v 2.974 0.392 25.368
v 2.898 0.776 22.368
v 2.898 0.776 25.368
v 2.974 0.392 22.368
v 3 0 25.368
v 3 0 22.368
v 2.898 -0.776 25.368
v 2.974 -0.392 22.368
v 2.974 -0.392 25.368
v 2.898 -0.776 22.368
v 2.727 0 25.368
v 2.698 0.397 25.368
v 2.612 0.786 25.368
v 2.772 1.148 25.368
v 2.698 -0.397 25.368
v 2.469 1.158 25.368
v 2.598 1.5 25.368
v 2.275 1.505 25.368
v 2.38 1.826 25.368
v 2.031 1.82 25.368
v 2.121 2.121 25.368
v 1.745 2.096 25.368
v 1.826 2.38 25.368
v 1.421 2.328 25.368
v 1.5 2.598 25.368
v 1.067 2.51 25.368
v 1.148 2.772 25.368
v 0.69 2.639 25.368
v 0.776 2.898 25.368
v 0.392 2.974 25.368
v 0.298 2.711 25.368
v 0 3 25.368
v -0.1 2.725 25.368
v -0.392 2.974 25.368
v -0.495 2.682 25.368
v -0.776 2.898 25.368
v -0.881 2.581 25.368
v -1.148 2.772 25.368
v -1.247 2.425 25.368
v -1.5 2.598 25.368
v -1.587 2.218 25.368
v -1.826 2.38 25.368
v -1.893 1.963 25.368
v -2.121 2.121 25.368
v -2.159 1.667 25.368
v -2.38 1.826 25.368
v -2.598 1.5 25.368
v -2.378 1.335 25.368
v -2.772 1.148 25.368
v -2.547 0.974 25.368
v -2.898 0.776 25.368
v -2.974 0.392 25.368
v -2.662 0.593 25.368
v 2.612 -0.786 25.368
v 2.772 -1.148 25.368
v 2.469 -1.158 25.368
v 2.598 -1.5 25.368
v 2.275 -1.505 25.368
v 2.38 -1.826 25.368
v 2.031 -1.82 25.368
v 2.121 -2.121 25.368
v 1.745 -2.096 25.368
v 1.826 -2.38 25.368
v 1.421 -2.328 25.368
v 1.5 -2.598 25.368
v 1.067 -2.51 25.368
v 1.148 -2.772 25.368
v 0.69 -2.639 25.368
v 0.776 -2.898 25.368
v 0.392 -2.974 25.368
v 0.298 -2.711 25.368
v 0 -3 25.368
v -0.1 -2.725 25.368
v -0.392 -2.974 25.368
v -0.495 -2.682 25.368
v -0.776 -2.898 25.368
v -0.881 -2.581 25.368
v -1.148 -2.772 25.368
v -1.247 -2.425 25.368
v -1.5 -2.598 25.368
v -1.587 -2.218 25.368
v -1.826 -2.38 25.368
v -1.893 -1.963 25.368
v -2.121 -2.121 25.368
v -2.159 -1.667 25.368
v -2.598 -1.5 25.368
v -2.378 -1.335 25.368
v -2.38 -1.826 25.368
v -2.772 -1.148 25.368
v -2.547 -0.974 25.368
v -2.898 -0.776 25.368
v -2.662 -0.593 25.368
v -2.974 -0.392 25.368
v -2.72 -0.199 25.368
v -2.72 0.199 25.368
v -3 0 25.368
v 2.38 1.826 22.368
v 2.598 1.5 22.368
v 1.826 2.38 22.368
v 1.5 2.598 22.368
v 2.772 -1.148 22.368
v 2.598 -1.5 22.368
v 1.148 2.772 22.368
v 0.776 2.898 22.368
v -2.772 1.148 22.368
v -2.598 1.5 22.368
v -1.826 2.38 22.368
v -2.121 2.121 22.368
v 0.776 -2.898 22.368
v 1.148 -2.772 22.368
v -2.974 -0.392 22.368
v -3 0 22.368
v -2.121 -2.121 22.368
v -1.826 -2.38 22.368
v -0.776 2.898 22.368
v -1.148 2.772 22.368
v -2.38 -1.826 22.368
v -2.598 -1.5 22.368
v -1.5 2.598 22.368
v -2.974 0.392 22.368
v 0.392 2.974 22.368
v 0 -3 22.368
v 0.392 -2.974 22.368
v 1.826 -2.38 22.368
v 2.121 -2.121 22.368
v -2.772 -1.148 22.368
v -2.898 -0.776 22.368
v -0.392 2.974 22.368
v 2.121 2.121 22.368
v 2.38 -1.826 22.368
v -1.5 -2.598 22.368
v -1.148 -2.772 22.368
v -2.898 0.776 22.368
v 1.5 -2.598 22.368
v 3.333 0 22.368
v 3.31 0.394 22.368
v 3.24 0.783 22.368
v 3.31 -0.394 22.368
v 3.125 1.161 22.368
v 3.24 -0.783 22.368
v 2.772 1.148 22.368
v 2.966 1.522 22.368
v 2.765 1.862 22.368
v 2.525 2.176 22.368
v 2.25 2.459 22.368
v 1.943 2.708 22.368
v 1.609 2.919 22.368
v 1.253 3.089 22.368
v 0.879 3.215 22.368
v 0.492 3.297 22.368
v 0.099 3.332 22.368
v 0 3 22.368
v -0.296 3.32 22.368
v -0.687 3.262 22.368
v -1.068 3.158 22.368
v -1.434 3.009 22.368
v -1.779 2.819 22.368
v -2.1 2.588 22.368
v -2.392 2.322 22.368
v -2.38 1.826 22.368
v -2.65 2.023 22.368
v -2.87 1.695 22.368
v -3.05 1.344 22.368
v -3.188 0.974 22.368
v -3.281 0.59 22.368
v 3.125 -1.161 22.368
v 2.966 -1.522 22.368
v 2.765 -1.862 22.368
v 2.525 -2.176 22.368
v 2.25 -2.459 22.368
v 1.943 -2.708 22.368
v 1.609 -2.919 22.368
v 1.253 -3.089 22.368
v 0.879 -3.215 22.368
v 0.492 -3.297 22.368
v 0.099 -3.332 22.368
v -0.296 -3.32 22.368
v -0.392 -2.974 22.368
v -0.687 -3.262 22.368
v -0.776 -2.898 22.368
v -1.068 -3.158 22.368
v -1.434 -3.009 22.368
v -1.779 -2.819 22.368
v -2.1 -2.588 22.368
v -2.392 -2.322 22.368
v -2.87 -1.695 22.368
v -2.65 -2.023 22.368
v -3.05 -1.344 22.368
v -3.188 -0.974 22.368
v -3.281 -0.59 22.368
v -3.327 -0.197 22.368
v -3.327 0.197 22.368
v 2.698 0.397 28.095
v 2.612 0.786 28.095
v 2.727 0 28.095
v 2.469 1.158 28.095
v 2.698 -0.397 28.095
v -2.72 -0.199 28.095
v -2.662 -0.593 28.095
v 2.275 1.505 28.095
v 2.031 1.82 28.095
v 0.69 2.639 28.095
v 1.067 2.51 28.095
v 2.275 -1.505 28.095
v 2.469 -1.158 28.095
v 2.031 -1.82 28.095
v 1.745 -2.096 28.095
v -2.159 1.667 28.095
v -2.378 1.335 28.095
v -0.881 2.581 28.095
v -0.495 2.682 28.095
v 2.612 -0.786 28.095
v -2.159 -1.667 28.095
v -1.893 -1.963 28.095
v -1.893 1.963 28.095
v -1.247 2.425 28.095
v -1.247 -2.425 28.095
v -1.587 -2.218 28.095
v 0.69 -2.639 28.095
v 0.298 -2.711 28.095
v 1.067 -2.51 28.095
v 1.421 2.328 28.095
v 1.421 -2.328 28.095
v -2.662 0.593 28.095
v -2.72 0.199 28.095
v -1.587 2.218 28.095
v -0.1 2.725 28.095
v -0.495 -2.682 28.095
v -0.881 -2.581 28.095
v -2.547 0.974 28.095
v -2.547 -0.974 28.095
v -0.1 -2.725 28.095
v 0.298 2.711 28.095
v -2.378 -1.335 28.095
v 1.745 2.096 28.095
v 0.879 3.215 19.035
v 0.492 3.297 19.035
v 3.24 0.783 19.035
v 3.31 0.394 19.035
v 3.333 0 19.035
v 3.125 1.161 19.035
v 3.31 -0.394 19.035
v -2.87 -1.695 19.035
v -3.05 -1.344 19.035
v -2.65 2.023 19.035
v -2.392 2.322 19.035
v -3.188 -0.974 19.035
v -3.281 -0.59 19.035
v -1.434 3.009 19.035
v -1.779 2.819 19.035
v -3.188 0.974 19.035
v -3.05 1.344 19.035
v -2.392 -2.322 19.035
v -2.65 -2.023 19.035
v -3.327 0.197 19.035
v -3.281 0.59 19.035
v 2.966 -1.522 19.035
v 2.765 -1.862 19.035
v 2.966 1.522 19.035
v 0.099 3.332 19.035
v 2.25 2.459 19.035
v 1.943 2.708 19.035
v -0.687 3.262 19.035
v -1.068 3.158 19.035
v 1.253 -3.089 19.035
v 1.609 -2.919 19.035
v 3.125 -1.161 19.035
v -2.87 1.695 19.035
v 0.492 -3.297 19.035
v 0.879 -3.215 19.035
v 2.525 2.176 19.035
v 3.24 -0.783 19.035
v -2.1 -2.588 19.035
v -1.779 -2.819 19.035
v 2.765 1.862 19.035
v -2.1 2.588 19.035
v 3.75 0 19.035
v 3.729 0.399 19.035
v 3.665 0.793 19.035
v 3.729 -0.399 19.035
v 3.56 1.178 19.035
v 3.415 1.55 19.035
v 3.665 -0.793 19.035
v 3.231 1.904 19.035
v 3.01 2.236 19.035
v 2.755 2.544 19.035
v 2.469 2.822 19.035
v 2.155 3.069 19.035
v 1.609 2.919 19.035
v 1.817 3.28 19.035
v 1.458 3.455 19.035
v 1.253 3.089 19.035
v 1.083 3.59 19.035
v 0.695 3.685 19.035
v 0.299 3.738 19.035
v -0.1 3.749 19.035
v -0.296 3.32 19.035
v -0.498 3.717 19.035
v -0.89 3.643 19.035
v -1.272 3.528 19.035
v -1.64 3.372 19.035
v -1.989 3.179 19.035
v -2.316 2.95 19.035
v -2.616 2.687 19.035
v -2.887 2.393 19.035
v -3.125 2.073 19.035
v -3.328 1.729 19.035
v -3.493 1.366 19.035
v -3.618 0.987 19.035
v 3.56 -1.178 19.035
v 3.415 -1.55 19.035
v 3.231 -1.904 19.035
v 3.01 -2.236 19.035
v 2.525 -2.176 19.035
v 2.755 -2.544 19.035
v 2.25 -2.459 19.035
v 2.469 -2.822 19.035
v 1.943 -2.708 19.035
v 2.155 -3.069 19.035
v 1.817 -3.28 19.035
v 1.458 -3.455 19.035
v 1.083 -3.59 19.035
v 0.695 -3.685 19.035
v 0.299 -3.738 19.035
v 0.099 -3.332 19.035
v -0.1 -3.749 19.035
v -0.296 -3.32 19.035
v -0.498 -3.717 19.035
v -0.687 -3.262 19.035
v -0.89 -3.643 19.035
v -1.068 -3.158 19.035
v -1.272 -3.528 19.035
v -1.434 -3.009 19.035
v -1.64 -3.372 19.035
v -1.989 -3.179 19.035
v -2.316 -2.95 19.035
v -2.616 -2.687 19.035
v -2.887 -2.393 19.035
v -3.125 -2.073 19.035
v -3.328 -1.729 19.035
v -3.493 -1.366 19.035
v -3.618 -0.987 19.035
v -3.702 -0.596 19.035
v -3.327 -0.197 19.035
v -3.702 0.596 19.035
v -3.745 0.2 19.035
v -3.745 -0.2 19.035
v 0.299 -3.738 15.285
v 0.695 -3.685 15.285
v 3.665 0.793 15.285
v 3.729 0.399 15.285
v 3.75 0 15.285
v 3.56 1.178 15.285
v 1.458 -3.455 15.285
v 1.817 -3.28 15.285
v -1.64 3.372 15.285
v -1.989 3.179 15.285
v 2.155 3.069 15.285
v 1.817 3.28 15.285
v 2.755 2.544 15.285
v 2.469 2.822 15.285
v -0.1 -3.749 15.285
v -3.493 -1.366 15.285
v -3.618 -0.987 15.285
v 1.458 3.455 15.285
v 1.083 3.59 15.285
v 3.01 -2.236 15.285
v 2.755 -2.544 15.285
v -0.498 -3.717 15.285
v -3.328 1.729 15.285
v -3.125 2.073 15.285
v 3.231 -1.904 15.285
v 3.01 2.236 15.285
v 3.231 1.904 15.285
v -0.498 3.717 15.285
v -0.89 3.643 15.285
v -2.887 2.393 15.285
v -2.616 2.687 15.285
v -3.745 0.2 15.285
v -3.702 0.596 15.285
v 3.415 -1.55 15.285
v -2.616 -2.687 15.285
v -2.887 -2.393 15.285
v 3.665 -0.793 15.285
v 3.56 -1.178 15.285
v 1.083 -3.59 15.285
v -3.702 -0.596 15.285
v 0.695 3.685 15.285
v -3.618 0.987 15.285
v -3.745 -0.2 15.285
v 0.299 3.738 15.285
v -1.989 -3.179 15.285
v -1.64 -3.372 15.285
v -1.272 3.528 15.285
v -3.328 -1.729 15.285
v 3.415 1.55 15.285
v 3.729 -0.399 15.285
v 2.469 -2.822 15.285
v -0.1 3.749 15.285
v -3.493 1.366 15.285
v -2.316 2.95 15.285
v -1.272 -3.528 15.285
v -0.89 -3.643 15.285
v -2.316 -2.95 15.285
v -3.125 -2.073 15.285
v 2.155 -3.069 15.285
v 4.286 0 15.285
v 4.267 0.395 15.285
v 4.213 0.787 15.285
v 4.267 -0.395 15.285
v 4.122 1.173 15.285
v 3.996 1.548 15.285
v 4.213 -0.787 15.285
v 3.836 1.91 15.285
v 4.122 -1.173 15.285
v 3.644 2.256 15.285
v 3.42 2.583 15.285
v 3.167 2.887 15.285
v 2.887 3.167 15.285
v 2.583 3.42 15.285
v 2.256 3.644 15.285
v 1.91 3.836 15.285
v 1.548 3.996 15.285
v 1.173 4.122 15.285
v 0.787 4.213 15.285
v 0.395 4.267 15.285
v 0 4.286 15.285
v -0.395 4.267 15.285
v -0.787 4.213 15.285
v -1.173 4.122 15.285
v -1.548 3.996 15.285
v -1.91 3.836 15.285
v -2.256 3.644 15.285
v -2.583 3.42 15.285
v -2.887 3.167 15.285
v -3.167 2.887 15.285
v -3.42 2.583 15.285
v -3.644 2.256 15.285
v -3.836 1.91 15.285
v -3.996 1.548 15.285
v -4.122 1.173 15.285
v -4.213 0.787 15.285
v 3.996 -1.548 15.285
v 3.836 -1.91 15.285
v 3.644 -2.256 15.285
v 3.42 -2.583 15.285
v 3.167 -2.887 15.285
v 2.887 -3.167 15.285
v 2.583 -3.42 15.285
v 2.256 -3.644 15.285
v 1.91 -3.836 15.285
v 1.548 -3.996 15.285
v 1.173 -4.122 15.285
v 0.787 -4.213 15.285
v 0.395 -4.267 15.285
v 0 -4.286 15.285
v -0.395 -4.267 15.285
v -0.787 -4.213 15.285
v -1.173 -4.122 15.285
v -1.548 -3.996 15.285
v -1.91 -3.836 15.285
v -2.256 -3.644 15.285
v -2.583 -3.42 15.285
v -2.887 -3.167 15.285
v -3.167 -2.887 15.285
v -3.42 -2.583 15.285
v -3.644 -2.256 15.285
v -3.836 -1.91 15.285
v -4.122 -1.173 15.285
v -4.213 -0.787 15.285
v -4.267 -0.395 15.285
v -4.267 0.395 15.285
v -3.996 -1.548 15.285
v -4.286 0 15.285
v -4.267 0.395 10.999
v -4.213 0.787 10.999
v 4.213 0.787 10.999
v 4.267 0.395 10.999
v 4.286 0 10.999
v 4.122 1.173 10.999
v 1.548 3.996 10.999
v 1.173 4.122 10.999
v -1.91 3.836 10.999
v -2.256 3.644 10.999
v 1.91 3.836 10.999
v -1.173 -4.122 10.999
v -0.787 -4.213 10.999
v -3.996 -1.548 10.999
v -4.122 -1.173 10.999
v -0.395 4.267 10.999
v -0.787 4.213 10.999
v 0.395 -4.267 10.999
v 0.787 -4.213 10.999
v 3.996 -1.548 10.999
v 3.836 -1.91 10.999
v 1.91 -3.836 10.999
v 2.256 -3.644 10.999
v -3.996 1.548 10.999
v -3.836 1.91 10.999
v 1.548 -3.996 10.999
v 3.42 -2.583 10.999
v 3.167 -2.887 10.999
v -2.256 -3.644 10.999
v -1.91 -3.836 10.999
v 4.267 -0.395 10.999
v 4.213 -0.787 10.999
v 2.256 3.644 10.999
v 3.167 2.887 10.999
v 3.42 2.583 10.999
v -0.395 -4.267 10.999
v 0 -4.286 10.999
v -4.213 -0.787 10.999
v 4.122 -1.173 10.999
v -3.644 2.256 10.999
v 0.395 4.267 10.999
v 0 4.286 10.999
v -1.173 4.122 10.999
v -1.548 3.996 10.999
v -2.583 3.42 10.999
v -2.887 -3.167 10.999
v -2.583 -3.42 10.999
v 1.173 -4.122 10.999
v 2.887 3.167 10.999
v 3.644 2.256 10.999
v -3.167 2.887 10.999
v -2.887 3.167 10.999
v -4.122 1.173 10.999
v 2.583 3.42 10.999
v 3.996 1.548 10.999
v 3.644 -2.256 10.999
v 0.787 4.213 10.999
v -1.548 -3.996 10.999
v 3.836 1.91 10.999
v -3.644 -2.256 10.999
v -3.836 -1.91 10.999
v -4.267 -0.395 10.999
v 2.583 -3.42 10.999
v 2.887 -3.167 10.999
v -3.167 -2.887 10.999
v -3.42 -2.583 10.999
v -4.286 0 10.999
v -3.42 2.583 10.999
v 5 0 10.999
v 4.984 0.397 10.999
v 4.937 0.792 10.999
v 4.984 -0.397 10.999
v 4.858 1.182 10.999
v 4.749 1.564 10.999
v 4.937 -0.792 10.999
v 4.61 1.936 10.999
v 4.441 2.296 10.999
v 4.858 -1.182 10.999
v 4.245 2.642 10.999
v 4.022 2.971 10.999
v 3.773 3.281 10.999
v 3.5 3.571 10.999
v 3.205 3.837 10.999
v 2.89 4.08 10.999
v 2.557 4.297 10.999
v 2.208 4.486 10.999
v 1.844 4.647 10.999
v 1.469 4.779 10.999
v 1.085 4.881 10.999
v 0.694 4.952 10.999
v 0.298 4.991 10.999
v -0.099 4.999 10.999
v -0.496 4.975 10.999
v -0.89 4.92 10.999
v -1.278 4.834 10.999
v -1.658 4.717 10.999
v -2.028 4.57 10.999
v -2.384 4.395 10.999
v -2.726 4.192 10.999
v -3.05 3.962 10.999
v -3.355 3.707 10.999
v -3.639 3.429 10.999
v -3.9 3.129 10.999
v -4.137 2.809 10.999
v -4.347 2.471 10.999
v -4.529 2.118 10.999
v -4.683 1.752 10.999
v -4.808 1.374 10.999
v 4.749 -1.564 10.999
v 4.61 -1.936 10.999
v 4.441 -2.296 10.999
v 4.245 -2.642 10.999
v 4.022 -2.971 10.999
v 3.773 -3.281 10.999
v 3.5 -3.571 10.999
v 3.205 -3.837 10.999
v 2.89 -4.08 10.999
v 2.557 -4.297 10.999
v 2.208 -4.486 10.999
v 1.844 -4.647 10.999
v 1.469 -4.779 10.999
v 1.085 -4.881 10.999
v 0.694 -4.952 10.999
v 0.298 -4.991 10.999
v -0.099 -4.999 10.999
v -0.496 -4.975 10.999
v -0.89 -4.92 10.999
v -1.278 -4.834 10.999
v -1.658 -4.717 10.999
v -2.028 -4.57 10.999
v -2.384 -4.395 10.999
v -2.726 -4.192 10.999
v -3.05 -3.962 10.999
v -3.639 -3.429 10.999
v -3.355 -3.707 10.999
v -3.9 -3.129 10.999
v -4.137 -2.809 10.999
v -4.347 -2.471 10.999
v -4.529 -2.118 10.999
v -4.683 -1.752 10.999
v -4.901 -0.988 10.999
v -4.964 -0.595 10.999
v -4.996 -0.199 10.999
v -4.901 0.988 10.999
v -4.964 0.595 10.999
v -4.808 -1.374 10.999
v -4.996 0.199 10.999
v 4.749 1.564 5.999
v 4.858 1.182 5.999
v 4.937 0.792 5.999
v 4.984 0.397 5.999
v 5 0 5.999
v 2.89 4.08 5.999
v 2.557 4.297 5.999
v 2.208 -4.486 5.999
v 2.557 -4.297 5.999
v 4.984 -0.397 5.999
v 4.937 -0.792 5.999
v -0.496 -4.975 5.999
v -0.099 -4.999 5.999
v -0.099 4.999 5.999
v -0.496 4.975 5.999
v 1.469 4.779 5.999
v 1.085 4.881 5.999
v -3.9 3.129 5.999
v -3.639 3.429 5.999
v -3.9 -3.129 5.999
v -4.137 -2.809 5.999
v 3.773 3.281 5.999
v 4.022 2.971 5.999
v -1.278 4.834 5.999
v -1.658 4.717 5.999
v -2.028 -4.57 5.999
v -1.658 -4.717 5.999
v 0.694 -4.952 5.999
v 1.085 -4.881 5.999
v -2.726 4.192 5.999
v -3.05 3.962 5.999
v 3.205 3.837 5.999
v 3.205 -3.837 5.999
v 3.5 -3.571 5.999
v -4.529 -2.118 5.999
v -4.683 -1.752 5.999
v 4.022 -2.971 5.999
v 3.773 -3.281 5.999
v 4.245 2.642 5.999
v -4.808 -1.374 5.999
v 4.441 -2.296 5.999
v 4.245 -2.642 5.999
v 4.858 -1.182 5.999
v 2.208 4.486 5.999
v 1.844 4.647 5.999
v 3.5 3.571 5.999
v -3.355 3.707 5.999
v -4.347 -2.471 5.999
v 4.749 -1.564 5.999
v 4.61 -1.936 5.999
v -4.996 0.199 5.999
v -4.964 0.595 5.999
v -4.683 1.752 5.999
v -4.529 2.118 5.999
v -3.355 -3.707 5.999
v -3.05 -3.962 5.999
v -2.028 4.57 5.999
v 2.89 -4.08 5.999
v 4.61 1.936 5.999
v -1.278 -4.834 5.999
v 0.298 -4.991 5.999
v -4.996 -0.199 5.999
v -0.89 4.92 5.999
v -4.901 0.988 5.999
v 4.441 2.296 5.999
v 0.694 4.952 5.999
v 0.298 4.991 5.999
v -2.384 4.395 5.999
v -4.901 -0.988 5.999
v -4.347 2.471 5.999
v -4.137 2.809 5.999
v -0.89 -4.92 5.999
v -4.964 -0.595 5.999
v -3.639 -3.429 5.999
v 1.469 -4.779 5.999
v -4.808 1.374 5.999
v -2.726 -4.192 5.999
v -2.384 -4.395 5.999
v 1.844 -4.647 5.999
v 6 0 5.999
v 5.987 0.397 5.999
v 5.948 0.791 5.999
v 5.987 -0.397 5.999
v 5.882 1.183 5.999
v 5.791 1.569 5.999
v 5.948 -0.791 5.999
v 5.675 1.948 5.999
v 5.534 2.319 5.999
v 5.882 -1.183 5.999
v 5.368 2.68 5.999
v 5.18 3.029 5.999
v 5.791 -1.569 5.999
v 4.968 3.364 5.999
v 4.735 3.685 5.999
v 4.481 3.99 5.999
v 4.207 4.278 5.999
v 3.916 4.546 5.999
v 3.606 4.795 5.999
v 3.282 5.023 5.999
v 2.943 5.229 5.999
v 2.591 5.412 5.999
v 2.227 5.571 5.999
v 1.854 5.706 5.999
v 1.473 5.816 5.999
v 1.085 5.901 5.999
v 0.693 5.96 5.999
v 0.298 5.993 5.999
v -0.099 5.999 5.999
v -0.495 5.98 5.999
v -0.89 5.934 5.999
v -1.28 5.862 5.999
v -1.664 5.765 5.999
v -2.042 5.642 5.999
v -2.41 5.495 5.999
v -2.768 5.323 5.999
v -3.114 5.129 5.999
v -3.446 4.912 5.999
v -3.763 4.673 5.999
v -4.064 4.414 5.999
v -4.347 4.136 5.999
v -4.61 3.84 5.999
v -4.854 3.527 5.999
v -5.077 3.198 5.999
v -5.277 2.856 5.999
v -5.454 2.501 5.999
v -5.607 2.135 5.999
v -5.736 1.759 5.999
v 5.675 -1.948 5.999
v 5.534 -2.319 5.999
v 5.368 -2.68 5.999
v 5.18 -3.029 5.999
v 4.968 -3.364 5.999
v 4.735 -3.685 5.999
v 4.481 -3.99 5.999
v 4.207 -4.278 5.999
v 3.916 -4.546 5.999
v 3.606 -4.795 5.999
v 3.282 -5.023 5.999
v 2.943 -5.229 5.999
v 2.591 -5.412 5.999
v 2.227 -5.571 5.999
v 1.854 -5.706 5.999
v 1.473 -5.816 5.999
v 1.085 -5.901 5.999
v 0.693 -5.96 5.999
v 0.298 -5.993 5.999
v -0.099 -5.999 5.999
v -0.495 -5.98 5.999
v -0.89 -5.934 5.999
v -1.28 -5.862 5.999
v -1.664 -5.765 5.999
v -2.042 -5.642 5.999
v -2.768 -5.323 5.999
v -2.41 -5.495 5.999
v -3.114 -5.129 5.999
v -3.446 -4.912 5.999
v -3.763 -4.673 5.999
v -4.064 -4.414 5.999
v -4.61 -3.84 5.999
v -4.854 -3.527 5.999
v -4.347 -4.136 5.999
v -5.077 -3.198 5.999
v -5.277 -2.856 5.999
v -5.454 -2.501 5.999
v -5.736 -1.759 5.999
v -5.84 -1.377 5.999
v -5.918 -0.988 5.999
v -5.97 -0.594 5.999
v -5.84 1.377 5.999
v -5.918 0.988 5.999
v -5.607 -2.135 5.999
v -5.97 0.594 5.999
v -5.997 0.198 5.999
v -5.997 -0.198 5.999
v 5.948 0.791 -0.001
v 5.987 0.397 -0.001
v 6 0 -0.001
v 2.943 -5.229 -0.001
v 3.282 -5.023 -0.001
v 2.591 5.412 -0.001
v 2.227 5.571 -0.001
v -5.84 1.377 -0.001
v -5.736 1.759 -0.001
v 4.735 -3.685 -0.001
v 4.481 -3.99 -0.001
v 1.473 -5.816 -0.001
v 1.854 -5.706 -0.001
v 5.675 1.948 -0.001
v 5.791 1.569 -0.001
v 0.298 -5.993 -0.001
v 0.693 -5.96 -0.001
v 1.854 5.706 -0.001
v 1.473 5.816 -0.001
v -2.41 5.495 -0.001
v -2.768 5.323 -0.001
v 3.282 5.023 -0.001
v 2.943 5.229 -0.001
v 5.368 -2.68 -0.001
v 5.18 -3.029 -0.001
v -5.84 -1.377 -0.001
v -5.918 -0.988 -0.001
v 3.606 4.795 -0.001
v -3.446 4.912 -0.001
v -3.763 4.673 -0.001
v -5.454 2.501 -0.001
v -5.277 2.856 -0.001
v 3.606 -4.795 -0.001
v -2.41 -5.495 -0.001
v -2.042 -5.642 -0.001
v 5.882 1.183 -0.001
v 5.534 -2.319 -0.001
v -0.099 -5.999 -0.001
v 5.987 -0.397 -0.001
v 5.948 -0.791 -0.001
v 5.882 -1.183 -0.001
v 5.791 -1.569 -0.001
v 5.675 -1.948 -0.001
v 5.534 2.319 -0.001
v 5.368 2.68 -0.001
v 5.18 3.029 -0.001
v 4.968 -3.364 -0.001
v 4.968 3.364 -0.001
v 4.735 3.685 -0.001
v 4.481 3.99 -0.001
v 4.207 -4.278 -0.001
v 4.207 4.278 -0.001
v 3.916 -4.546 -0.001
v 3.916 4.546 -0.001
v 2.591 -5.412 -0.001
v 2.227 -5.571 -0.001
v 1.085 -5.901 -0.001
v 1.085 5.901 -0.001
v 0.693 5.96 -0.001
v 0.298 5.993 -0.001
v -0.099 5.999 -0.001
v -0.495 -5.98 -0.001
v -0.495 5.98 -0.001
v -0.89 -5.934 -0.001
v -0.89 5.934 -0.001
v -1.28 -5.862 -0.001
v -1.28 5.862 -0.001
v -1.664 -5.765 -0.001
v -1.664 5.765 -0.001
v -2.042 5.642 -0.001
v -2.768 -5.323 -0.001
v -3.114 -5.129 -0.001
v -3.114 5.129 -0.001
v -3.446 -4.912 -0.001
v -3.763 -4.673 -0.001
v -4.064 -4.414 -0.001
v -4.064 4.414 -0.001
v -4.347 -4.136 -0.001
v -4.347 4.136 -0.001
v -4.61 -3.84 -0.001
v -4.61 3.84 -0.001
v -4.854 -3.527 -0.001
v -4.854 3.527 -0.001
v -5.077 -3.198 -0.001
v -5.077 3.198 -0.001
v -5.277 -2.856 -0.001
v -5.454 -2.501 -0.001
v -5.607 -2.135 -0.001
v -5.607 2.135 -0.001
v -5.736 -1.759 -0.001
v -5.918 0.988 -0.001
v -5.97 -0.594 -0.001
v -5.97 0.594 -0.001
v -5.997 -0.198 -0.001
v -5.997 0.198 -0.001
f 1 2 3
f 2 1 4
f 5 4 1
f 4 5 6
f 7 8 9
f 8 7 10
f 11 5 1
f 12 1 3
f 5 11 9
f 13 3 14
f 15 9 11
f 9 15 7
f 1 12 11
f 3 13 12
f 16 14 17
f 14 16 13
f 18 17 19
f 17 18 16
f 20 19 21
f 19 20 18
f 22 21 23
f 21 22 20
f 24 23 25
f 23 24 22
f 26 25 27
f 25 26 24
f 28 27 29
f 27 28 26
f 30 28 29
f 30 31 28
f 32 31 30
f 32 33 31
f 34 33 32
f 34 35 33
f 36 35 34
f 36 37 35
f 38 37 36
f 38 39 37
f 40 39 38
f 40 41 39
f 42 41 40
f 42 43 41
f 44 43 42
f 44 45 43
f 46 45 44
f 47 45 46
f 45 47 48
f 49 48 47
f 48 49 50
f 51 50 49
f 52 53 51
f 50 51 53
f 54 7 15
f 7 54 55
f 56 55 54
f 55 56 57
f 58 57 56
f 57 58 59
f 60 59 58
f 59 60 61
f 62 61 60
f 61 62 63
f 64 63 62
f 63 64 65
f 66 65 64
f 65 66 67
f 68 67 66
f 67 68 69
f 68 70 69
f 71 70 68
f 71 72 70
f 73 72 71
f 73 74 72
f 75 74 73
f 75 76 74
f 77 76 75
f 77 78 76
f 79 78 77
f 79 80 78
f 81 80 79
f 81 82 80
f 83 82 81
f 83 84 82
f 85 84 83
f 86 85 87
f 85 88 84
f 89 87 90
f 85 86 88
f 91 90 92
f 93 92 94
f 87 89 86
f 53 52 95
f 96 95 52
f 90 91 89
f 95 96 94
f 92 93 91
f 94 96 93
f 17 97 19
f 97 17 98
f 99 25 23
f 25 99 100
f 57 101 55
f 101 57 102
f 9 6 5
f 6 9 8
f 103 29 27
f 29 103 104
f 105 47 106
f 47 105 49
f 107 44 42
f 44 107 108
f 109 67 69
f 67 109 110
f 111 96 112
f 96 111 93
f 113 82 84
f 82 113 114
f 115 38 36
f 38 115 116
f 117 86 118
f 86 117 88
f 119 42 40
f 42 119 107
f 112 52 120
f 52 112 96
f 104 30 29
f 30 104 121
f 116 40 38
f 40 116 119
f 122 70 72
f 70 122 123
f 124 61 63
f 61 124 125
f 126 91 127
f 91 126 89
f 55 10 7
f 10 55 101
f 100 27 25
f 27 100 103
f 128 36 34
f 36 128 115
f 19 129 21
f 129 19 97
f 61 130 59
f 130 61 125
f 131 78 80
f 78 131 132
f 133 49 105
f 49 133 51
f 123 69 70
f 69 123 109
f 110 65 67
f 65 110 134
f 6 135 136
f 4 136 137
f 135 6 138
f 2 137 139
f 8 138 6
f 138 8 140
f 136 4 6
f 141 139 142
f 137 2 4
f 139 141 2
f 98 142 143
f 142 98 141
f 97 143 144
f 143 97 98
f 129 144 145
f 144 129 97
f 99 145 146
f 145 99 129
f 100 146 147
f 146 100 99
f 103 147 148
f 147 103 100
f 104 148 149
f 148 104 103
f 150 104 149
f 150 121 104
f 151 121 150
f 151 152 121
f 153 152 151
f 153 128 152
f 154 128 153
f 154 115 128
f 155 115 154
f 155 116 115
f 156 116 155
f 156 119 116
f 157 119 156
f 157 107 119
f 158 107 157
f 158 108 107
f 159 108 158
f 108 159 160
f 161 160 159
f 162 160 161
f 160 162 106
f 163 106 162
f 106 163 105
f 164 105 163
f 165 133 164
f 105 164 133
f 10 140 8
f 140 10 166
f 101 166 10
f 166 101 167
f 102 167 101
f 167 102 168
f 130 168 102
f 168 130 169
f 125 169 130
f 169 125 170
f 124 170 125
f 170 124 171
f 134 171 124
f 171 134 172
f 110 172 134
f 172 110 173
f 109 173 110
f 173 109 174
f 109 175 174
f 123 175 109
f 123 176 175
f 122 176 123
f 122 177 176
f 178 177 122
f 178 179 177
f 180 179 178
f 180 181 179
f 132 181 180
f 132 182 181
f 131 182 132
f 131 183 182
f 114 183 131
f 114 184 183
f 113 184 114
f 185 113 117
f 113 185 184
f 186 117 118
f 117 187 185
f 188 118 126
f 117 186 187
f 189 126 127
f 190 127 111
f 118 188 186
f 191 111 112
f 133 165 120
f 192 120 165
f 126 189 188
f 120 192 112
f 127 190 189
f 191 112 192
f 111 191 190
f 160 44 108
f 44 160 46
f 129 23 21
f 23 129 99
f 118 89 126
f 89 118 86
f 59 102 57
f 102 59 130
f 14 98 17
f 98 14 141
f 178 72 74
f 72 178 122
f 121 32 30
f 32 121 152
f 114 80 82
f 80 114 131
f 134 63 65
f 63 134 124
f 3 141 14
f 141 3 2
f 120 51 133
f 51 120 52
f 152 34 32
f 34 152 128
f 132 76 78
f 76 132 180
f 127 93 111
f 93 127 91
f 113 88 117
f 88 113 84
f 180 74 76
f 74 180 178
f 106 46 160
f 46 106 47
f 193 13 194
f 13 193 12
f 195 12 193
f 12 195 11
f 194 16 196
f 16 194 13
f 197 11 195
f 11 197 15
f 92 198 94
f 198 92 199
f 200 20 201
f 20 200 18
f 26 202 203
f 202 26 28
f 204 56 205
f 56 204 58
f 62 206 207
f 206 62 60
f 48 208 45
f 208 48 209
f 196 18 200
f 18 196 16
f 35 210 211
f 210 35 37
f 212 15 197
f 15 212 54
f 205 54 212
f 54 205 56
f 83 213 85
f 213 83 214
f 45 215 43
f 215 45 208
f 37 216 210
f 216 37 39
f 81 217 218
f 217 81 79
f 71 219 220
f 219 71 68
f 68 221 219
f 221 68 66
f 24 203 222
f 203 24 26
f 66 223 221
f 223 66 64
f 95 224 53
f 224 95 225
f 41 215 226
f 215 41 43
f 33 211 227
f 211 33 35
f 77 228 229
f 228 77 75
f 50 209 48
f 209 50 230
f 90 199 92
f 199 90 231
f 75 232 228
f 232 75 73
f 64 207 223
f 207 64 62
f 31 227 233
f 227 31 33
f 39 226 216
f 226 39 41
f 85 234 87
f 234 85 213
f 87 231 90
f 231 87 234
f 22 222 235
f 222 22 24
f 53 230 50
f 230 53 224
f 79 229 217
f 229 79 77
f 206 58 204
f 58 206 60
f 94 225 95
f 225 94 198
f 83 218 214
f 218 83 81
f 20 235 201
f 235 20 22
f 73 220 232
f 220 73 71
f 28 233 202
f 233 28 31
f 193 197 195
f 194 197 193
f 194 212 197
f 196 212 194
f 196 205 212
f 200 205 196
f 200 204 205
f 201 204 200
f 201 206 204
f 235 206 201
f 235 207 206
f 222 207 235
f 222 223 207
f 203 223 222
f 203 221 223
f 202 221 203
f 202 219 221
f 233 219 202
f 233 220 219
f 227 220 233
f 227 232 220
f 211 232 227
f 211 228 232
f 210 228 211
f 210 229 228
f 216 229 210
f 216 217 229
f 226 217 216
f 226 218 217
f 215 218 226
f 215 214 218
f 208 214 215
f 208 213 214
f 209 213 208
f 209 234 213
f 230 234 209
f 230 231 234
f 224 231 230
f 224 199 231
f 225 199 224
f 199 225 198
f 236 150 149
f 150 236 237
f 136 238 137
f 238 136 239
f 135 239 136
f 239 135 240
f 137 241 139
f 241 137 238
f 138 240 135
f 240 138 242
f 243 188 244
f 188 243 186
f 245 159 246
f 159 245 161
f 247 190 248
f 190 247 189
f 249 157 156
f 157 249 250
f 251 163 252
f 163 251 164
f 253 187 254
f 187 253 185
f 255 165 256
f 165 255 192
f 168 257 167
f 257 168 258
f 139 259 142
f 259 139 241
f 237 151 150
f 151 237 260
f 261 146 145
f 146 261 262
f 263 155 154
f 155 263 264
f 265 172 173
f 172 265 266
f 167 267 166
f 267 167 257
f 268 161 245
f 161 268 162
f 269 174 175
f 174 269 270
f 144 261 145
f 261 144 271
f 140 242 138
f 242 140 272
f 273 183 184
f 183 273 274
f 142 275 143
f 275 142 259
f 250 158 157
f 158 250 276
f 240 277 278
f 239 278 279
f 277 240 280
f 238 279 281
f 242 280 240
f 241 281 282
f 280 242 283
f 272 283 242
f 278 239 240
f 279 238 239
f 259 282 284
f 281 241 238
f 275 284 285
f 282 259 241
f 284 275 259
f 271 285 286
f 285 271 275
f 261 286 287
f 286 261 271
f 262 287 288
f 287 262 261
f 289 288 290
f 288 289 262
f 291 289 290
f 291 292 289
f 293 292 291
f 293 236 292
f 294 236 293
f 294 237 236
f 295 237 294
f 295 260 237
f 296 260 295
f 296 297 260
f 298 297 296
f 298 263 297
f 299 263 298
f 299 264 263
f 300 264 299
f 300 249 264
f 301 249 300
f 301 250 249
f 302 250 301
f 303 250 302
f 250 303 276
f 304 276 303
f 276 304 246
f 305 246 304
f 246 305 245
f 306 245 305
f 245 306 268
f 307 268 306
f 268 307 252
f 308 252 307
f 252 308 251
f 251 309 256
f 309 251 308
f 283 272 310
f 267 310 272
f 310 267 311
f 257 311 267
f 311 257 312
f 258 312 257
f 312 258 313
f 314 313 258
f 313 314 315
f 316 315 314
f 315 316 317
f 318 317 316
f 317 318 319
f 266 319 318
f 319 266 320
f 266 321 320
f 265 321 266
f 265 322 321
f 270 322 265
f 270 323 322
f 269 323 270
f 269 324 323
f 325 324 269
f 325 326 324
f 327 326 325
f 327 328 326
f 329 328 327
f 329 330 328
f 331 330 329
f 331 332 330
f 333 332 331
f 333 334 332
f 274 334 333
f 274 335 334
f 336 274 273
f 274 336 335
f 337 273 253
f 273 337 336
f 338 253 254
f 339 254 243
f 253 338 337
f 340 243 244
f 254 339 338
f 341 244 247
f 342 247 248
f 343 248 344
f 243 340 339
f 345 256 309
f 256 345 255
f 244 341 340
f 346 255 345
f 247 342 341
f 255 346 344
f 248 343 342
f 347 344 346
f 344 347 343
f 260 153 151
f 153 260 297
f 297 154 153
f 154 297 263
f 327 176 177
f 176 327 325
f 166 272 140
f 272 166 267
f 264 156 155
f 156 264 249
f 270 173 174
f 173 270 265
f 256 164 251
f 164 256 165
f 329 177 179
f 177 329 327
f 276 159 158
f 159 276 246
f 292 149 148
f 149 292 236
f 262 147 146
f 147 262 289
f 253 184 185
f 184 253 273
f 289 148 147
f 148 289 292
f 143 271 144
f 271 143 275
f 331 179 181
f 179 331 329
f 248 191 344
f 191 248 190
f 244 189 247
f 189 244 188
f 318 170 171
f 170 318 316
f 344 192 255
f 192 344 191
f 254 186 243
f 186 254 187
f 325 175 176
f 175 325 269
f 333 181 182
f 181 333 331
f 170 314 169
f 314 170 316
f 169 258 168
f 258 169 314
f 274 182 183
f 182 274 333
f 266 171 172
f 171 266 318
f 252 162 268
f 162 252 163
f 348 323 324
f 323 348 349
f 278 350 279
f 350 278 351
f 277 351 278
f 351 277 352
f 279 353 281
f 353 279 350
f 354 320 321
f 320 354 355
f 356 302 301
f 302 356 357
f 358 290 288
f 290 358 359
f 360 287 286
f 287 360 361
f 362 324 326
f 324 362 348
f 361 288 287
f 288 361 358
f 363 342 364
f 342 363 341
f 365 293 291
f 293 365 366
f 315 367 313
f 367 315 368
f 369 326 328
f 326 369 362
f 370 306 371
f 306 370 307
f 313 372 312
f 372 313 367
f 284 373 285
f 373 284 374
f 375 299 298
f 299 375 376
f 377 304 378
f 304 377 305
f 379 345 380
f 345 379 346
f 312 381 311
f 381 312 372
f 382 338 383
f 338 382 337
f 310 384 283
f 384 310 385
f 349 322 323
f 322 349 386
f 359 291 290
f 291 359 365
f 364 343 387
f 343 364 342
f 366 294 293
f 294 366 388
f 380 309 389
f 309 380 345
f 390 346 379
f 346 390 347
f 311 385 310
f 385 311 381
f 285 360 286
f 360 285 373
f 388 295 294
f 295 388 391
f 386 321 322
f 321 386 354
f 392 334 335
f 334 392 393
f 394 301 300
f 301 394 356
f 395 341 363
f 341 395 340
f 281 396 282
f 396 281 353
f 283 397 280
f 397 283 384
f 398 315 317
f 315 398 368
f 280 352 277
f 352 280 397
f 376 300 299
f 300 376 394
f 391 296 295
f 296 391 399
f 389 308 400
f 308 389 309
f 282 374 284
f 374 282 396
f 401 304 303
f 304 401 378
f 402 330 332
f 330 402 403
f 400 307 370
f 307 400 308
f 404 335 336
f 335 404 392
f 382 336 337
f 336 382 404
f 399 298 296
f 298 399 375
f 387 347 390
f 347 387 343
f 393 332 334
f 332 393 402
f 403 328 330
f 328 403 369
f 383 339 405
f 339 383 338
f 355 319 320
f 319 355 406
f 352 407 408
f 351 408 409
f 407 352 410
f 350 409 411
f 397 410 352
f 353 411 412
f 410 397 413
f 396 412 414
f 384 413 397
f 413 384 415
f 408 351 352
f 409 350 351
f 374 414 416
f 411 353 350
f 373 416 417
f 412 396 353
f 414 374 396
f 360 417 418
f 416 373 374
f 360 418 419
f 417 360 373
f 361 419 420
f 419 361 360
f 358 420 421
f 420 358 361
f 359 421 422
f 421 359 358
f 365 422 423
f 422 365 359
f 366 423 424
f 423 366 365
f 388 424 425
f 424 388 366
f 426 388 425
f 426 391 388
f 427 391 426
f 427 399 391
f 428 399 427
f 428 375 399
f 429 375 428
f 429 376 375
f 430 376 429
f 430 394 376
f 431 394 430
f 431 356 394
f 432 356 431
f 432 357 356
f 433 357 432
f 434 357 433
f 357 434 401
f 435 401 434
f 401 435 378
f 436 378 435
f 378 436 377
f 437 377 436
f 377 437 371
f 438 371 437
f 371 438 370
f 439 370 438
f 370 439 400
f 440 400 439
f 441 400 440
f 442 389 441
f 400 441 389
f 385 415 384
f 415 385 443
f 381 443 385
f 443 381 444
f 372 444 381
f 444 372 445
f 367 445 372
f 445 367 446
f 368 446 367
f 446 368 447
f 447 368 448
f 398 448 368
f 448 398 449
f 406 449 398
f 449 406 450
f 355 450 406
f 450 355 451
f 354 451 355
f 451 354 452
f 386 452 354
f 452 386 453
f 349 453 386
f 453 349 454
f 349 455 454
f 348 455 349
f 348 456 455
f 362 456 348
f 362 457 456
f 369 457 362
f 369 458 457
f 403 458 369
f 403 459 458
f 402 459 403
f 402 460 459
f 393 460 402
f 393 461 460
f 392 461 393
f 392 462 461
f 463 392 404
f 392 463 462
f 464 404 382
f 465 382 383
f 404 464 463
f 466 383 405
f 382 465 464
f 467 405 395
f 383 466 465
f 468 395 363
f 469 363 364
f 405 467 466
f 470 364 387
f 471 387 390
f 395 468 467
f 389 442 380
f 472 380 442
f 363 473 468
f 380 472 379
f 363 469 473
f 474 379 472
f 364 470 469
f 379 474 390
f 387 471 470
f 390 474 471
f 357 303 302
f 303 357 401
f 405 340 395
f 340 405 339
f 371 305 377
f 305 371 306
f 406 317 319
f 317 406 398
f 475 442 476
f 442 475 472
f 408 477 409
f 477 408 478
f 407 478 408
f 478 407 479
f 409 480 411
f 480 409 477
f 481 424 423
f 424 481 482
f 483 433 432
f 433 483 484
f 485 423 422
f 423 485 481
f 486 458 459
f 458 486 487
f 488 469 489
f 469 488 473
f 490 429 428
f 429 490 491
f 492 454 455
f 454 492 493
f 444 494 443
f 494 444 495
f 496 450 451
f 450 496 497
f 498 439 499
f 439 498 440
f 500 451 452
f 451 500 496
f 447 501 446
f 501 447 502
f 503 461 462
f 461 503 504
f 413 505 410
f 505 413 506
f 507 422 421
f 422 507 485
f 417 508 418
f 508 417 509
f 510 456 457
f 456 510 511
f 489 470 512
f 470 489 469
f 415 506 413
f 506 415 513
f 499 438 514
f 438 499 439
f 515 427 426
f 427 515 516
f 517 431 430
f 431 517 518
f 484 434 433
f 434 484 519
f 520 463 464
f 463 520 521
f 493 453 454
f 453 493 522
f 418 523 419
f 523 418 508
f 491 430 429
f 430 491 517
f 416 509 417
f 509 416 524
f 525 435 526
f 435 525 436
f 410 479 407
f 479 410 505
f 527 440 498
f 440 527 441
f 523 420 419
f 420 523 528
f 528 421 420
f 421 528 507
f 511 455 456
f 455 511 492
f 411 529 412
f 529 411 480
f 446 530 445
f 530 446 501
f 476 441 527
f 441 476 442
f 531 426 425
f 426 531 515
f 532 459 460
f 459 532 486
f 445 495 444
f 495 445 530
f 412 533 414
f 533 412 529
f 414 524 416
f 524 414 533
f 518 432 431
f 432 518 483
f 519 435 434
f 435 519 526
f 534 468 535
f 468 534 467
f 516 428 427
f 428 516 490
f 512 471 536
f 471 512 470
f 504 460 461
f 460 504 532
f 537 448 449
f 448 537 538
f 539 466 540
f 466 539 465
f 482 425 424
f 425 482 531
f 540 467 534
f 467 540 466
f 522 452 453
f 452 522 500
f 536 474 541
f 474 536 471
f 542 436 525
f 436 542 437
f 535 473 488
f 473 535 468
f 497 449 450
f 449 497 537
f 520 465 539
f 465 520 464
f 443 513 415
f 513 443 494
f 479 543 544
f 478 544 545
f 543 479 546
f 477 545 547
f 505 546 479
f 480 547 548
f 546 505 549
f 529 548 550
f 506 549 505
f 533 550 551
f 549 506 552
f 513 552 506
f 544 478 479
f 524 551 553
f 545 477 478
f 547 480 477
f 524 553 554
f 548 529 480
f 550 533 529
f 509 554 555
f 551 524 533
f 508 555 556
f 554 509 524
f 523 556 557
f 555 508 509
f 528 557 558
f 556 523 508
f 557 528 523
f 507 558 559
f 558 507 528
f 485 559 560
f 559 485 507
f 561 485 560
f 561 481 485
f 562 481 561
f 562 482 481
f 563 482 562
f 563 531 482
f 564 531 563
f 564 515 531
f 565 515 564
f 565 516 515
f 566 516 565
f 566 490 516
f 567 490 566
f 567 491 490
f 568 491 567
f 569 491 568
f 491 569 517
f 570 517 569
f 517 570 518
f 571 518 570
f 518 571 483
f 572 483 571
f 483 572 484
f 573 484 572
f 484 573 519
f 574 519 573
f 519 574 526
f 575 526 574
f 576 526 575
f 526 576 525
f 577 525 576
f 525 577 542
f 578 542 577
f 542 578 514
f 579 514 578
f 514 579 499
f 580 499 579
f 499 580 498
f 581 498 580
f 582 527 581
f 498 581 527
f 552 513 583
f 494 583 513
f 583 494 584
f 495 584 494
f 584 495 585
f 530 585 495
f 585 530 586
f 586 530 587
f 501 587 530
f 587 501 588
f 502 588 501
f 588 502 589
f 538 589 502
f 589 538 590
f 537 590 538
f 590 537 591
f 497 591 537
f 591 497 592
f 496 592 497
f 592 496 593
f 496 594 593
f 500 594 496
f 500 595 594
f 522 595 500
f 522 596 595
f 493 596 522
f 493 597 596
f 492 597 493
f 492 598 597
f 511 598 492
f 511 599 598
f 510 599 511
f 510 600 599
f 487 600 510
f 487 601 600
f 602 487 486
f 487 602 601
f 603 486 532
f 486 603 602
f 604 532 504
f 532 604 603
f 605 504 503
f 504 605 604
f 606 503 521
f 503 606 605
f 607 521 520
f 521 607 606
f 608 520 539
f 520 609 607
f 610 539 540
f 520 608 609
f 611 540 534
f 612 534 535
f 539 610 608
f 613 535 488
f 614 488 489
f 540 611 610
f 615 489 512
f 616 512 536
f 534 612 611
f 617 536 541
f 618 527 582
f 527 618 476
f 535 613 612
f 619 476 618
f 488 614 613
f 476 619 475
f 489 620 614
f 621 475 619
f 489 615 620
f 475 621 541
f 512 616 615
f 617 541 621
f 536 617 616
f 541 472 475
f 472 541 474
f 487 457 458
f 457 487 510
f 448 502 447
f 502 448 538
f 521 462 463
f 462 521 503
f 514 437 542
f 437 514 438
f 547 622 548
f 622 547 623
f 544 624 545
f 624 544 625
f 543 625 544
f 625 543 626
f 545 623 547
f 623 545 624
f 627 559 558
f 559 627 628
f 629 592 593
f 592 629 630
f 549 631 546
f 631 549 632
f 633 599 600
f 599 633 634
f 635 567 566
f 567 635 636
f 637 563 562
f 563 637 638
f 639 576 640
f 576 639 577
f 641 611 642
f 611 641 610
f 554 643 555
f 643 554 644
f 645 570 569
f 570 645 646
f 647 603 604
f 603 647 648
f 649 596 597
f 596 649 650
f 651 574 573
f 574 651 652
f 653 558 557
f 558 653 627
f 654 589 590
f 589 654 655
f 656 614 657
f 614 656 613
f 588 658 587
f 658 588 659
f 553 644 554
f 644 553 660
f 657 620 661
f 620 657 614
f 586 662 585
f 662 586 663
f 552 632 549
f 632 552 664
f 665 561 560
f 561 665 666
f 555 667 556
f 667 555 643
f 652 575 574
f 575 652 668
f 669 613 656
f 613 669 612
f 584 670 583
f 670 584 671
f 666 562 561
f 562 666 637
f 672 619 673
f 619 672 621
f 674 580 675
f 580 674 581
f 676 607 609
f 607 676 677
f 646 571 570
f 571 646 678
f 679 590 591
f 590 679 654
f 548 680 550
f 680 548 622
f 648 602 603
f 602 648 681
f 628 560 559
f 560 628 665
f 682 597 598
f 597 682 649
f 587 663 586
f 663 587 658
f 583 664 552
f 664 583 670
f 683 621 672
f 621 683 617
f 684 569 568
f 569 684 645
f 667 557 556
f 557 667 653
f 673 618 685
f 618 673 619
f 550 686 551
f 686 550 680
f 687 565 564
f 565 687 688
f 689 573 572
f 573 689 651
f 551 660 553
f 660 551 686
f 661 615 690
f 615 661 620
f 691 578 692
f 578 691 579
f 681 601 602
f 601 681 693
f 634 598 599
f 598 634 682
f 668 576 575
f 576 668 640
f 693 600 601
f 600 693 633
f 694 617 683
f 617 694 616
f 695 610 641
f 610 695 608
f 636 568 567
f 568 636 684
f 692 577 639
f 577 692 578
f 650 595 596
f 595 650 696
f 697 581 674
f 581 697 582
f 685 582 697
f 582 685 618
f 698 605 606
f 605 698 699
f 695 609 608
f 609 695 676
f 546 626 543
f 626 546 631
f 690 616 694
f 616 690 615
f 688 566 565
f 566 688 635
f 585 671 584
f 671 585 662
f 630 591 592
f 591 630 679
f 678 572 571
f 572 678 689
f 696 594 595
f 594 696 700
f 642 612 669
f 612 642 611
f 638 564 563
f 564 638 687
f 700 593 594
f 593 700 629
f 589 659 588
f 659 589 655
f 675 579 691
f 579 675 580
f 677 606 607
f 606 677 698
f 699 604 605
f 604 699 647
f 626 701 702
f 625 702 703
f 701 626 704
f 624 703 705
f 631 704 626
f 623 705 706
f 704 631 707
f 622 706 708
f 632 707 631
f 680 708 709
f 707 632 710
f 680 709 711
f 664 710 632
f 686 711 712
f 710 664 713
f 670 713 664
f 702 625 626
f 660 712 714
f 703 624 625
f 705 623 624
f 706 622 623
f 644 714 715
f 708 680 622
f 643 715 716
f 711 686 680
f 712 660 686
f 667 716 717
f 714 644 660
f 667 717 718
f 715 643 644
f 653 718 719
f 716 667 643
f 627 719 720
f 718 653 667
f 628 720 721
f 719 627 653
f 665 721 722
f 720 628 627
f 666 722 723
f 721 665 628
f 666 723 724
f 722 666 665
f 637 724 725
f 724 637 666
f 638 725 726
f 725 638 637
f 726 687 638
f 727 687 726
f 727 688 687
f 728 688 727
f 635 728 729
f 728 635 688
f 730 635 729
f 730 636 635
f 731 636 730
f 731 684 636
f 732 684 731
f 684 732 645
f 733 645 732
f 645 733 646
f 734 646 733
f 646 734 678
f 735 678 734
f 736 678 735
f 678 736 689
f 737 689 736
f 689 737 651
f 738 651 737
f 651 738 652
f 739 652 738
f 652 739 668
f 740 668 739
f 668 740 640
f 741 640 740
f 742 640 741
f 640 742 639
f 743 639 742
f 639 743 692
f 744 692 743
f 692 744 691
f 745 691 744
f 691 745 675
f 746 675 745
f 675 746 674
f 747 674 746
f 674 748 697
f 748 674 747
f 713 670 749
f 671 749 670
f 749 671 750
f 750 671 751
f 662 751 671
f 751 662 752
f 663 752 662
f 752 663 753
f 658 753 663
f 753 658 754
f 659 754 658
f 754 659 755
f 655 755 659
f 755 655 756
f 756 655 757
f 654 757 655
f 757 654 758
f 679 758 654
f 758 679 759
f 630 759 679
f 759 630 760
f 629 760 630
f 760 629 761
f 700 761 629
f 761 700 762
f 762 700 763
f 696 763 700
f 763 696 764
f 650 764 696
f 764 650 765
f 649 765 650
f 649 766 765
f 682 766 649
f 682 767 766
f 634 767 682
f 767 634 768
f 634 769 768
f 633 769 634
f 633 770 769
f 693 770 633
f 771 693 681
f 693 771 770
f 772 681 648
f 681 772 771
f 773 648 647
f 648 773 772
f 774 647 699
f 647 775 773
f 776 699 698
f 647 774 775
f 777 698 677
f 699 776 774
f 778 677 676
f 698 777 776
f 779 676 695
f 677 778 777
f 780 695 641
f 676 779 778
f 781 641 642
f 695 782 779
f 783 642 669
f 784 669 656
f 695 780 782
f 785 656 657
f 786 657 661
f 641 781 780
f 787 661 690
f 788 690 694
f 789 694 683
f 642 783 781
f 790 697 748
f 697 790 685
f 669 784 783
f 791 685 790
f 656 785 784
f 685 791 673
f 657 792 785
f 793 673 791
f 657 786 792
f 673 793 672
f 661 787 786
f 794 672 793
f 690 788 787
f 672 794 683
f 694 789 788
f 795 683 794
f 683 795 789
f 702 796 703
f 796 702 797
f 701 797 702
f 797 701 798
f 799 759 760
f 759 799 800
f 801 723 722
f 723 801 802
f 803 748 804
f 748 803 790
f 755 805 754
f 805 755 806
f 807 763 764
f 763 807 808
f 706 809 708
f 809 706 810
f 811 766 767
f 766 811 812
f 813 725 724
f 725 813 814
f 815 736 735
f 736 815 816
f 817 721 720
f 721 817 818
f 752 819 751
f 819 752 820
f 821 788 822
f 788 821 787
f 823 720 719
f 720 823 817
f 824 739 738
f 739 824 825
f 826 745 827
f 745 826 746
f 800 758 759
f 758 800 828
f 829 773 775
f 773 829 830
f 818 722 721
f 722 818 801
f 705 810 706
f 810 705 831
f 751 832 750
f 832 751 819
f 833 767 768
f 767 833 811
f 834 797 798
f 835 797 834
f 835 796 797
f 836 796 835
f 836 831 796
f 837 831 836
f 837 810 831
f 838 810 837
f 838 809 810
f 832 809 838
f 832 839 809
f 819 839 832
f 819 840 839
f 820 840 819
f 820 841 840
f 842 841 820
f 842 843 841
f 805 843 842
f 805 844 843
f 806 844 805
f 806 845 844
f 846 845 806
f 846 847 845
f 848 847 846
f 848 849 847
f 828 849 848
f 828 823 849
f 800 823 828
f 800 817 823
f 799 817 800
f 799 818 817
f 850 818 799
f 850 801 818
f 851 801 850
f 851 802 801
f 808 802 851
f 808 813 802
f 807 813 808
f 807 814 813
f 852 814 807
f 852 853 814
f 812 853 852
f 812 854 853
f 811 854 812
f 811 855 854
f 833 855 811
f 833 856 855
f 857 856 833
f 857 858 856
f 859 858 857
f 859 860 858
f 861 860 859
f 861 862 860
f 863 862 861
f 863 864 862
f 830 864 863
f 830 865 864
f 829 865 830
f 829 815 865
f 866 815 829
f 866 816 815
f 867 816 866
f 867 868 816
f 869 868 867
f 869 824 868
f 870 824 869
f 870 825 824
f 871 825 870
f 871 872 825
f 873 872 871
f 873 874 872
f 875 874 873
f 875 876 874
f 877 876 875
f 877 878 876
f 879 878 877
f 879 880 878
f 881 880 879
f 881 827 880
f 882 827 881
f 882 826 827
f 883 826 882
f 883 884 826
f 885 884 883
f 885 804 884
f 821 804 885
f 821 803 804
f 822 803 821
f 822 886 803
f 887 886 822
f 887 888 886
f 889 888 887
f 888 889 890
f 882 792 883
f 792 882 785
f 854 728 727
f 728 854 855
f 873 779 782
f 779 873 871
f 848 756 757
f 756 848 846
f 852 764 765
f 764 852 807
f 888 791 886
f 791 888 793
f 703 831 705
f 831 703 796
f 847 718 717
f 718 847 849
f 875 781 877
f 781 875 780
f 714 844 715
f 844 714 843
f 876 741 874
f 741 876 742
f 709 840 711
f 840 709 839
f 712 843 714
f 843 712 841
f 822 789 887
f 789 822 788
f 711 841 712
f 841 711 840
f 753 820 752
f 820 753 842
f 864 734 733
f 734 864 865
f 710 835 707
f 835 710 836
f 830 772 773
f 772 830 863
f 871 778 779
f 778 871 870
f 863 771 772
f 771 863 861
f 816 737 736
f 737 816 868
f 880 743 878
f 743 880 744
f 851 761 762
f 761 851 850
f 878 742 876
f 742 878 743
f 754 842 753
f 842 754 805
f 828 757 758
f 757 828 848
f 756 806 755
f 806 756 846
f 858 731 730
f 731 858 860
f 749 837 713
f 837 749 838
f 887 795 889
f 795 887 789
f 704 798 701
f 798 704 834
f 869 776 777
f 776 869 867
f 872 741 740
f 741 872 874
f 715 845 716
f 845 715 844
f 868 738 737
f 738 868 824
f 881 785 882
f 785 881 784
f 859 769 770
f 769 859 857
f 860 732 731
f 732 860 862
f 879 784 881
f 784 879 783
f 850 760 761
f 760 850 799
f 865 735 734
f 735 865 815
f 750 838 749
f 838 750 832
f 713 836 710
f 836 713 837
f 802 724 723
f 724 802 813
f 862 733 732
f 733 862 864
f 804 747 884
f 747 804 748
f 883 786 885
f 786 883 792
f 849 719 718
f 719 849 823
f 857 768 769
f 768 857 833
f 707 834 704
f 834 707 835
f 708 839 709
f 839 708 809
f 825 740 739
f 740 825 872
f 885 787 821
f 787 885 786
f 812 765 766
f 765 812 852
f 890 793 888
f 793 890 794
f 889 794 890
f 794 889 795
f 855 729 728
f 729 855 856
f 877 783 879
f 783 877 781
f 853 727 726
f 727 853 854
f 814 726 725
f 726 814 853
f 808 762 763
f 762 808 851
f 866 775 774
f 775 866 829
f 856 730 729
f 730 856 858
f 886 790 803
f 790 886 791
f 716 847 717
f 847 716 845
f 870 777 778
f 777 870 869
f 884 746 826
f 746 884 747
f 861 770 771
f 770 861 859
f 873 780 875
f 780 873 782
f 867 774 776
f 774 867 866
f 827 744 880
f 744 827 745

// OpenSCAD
//All units are in millimeters

//Optimal settings
$fa = 1;
$fs = 0.4;

function overlapForPrinting() = 0.001;
function heightOfModel() = 30;
function widthOfModel() = 30;

//Height and Width functions to choose from
function inverseHeight(maxHeight, step) = maxHeight/step;
function inverseWidth(maxWidth, step) = maxWidth/step;
function logisticHeight(maxHeight, step) = maxHeight / (3+exp(step/3));
function logisticWidth(maxWidth, step) = maxWidth / (3+exp(step/3)); 

//Assigning the equations used to determine height and width
function height(maxHeight, step) = inverseHeight(maxHeight, step);
function width(maxWidth, step) = inverseWidth(maxWidth, step); 
function addHeight(currHeight, addHeight) = currHeight+addHeight;

//Creating a cylinder step
module eachStep(maxStepsHeight, maxStepsWidth, currStepsHeight, stepNum){
        newHeight = height(maxHeight=maxStepsHeight, step=stepNum);
        newWidth = width(maxWidth=maxStepsWidth, step=stepNum);
        translate([0,0, currStepsHeight-overlapForPrinting()])
            cylinder(h=newHeight, r=newWidth);
}

//Recursively stacking the steps
module stackSteps(maxHeight, maxWidth, currHeight = 0, currStep){
    nextStep = height(maxHeight, currStep);
    if (currHeight+nextStep >= maxHeight) {
        echo("Complete");
    }
    else {
        eachStep(maxStepsHeight=maxHeight, maxStepsWidth=maxWidth, currStepsHeight=currHeight, stepNum=currStep);
        newCurrHeight = addHeight(currHeight=currHeight, addHeight=nextStep);
        newCurrStep = currStep + 1;
        stackSteps(maxHeight=maxHeight, maxWidth=maxWidth, currHeight=newCurrHeight, currStep = newCurrStep);
    }     
}

//Creating a cylinder stair step pattern
stackSteps(maxHeight = heightOfModel(), maxWidth = widthOfModel(), currStep = 5);
